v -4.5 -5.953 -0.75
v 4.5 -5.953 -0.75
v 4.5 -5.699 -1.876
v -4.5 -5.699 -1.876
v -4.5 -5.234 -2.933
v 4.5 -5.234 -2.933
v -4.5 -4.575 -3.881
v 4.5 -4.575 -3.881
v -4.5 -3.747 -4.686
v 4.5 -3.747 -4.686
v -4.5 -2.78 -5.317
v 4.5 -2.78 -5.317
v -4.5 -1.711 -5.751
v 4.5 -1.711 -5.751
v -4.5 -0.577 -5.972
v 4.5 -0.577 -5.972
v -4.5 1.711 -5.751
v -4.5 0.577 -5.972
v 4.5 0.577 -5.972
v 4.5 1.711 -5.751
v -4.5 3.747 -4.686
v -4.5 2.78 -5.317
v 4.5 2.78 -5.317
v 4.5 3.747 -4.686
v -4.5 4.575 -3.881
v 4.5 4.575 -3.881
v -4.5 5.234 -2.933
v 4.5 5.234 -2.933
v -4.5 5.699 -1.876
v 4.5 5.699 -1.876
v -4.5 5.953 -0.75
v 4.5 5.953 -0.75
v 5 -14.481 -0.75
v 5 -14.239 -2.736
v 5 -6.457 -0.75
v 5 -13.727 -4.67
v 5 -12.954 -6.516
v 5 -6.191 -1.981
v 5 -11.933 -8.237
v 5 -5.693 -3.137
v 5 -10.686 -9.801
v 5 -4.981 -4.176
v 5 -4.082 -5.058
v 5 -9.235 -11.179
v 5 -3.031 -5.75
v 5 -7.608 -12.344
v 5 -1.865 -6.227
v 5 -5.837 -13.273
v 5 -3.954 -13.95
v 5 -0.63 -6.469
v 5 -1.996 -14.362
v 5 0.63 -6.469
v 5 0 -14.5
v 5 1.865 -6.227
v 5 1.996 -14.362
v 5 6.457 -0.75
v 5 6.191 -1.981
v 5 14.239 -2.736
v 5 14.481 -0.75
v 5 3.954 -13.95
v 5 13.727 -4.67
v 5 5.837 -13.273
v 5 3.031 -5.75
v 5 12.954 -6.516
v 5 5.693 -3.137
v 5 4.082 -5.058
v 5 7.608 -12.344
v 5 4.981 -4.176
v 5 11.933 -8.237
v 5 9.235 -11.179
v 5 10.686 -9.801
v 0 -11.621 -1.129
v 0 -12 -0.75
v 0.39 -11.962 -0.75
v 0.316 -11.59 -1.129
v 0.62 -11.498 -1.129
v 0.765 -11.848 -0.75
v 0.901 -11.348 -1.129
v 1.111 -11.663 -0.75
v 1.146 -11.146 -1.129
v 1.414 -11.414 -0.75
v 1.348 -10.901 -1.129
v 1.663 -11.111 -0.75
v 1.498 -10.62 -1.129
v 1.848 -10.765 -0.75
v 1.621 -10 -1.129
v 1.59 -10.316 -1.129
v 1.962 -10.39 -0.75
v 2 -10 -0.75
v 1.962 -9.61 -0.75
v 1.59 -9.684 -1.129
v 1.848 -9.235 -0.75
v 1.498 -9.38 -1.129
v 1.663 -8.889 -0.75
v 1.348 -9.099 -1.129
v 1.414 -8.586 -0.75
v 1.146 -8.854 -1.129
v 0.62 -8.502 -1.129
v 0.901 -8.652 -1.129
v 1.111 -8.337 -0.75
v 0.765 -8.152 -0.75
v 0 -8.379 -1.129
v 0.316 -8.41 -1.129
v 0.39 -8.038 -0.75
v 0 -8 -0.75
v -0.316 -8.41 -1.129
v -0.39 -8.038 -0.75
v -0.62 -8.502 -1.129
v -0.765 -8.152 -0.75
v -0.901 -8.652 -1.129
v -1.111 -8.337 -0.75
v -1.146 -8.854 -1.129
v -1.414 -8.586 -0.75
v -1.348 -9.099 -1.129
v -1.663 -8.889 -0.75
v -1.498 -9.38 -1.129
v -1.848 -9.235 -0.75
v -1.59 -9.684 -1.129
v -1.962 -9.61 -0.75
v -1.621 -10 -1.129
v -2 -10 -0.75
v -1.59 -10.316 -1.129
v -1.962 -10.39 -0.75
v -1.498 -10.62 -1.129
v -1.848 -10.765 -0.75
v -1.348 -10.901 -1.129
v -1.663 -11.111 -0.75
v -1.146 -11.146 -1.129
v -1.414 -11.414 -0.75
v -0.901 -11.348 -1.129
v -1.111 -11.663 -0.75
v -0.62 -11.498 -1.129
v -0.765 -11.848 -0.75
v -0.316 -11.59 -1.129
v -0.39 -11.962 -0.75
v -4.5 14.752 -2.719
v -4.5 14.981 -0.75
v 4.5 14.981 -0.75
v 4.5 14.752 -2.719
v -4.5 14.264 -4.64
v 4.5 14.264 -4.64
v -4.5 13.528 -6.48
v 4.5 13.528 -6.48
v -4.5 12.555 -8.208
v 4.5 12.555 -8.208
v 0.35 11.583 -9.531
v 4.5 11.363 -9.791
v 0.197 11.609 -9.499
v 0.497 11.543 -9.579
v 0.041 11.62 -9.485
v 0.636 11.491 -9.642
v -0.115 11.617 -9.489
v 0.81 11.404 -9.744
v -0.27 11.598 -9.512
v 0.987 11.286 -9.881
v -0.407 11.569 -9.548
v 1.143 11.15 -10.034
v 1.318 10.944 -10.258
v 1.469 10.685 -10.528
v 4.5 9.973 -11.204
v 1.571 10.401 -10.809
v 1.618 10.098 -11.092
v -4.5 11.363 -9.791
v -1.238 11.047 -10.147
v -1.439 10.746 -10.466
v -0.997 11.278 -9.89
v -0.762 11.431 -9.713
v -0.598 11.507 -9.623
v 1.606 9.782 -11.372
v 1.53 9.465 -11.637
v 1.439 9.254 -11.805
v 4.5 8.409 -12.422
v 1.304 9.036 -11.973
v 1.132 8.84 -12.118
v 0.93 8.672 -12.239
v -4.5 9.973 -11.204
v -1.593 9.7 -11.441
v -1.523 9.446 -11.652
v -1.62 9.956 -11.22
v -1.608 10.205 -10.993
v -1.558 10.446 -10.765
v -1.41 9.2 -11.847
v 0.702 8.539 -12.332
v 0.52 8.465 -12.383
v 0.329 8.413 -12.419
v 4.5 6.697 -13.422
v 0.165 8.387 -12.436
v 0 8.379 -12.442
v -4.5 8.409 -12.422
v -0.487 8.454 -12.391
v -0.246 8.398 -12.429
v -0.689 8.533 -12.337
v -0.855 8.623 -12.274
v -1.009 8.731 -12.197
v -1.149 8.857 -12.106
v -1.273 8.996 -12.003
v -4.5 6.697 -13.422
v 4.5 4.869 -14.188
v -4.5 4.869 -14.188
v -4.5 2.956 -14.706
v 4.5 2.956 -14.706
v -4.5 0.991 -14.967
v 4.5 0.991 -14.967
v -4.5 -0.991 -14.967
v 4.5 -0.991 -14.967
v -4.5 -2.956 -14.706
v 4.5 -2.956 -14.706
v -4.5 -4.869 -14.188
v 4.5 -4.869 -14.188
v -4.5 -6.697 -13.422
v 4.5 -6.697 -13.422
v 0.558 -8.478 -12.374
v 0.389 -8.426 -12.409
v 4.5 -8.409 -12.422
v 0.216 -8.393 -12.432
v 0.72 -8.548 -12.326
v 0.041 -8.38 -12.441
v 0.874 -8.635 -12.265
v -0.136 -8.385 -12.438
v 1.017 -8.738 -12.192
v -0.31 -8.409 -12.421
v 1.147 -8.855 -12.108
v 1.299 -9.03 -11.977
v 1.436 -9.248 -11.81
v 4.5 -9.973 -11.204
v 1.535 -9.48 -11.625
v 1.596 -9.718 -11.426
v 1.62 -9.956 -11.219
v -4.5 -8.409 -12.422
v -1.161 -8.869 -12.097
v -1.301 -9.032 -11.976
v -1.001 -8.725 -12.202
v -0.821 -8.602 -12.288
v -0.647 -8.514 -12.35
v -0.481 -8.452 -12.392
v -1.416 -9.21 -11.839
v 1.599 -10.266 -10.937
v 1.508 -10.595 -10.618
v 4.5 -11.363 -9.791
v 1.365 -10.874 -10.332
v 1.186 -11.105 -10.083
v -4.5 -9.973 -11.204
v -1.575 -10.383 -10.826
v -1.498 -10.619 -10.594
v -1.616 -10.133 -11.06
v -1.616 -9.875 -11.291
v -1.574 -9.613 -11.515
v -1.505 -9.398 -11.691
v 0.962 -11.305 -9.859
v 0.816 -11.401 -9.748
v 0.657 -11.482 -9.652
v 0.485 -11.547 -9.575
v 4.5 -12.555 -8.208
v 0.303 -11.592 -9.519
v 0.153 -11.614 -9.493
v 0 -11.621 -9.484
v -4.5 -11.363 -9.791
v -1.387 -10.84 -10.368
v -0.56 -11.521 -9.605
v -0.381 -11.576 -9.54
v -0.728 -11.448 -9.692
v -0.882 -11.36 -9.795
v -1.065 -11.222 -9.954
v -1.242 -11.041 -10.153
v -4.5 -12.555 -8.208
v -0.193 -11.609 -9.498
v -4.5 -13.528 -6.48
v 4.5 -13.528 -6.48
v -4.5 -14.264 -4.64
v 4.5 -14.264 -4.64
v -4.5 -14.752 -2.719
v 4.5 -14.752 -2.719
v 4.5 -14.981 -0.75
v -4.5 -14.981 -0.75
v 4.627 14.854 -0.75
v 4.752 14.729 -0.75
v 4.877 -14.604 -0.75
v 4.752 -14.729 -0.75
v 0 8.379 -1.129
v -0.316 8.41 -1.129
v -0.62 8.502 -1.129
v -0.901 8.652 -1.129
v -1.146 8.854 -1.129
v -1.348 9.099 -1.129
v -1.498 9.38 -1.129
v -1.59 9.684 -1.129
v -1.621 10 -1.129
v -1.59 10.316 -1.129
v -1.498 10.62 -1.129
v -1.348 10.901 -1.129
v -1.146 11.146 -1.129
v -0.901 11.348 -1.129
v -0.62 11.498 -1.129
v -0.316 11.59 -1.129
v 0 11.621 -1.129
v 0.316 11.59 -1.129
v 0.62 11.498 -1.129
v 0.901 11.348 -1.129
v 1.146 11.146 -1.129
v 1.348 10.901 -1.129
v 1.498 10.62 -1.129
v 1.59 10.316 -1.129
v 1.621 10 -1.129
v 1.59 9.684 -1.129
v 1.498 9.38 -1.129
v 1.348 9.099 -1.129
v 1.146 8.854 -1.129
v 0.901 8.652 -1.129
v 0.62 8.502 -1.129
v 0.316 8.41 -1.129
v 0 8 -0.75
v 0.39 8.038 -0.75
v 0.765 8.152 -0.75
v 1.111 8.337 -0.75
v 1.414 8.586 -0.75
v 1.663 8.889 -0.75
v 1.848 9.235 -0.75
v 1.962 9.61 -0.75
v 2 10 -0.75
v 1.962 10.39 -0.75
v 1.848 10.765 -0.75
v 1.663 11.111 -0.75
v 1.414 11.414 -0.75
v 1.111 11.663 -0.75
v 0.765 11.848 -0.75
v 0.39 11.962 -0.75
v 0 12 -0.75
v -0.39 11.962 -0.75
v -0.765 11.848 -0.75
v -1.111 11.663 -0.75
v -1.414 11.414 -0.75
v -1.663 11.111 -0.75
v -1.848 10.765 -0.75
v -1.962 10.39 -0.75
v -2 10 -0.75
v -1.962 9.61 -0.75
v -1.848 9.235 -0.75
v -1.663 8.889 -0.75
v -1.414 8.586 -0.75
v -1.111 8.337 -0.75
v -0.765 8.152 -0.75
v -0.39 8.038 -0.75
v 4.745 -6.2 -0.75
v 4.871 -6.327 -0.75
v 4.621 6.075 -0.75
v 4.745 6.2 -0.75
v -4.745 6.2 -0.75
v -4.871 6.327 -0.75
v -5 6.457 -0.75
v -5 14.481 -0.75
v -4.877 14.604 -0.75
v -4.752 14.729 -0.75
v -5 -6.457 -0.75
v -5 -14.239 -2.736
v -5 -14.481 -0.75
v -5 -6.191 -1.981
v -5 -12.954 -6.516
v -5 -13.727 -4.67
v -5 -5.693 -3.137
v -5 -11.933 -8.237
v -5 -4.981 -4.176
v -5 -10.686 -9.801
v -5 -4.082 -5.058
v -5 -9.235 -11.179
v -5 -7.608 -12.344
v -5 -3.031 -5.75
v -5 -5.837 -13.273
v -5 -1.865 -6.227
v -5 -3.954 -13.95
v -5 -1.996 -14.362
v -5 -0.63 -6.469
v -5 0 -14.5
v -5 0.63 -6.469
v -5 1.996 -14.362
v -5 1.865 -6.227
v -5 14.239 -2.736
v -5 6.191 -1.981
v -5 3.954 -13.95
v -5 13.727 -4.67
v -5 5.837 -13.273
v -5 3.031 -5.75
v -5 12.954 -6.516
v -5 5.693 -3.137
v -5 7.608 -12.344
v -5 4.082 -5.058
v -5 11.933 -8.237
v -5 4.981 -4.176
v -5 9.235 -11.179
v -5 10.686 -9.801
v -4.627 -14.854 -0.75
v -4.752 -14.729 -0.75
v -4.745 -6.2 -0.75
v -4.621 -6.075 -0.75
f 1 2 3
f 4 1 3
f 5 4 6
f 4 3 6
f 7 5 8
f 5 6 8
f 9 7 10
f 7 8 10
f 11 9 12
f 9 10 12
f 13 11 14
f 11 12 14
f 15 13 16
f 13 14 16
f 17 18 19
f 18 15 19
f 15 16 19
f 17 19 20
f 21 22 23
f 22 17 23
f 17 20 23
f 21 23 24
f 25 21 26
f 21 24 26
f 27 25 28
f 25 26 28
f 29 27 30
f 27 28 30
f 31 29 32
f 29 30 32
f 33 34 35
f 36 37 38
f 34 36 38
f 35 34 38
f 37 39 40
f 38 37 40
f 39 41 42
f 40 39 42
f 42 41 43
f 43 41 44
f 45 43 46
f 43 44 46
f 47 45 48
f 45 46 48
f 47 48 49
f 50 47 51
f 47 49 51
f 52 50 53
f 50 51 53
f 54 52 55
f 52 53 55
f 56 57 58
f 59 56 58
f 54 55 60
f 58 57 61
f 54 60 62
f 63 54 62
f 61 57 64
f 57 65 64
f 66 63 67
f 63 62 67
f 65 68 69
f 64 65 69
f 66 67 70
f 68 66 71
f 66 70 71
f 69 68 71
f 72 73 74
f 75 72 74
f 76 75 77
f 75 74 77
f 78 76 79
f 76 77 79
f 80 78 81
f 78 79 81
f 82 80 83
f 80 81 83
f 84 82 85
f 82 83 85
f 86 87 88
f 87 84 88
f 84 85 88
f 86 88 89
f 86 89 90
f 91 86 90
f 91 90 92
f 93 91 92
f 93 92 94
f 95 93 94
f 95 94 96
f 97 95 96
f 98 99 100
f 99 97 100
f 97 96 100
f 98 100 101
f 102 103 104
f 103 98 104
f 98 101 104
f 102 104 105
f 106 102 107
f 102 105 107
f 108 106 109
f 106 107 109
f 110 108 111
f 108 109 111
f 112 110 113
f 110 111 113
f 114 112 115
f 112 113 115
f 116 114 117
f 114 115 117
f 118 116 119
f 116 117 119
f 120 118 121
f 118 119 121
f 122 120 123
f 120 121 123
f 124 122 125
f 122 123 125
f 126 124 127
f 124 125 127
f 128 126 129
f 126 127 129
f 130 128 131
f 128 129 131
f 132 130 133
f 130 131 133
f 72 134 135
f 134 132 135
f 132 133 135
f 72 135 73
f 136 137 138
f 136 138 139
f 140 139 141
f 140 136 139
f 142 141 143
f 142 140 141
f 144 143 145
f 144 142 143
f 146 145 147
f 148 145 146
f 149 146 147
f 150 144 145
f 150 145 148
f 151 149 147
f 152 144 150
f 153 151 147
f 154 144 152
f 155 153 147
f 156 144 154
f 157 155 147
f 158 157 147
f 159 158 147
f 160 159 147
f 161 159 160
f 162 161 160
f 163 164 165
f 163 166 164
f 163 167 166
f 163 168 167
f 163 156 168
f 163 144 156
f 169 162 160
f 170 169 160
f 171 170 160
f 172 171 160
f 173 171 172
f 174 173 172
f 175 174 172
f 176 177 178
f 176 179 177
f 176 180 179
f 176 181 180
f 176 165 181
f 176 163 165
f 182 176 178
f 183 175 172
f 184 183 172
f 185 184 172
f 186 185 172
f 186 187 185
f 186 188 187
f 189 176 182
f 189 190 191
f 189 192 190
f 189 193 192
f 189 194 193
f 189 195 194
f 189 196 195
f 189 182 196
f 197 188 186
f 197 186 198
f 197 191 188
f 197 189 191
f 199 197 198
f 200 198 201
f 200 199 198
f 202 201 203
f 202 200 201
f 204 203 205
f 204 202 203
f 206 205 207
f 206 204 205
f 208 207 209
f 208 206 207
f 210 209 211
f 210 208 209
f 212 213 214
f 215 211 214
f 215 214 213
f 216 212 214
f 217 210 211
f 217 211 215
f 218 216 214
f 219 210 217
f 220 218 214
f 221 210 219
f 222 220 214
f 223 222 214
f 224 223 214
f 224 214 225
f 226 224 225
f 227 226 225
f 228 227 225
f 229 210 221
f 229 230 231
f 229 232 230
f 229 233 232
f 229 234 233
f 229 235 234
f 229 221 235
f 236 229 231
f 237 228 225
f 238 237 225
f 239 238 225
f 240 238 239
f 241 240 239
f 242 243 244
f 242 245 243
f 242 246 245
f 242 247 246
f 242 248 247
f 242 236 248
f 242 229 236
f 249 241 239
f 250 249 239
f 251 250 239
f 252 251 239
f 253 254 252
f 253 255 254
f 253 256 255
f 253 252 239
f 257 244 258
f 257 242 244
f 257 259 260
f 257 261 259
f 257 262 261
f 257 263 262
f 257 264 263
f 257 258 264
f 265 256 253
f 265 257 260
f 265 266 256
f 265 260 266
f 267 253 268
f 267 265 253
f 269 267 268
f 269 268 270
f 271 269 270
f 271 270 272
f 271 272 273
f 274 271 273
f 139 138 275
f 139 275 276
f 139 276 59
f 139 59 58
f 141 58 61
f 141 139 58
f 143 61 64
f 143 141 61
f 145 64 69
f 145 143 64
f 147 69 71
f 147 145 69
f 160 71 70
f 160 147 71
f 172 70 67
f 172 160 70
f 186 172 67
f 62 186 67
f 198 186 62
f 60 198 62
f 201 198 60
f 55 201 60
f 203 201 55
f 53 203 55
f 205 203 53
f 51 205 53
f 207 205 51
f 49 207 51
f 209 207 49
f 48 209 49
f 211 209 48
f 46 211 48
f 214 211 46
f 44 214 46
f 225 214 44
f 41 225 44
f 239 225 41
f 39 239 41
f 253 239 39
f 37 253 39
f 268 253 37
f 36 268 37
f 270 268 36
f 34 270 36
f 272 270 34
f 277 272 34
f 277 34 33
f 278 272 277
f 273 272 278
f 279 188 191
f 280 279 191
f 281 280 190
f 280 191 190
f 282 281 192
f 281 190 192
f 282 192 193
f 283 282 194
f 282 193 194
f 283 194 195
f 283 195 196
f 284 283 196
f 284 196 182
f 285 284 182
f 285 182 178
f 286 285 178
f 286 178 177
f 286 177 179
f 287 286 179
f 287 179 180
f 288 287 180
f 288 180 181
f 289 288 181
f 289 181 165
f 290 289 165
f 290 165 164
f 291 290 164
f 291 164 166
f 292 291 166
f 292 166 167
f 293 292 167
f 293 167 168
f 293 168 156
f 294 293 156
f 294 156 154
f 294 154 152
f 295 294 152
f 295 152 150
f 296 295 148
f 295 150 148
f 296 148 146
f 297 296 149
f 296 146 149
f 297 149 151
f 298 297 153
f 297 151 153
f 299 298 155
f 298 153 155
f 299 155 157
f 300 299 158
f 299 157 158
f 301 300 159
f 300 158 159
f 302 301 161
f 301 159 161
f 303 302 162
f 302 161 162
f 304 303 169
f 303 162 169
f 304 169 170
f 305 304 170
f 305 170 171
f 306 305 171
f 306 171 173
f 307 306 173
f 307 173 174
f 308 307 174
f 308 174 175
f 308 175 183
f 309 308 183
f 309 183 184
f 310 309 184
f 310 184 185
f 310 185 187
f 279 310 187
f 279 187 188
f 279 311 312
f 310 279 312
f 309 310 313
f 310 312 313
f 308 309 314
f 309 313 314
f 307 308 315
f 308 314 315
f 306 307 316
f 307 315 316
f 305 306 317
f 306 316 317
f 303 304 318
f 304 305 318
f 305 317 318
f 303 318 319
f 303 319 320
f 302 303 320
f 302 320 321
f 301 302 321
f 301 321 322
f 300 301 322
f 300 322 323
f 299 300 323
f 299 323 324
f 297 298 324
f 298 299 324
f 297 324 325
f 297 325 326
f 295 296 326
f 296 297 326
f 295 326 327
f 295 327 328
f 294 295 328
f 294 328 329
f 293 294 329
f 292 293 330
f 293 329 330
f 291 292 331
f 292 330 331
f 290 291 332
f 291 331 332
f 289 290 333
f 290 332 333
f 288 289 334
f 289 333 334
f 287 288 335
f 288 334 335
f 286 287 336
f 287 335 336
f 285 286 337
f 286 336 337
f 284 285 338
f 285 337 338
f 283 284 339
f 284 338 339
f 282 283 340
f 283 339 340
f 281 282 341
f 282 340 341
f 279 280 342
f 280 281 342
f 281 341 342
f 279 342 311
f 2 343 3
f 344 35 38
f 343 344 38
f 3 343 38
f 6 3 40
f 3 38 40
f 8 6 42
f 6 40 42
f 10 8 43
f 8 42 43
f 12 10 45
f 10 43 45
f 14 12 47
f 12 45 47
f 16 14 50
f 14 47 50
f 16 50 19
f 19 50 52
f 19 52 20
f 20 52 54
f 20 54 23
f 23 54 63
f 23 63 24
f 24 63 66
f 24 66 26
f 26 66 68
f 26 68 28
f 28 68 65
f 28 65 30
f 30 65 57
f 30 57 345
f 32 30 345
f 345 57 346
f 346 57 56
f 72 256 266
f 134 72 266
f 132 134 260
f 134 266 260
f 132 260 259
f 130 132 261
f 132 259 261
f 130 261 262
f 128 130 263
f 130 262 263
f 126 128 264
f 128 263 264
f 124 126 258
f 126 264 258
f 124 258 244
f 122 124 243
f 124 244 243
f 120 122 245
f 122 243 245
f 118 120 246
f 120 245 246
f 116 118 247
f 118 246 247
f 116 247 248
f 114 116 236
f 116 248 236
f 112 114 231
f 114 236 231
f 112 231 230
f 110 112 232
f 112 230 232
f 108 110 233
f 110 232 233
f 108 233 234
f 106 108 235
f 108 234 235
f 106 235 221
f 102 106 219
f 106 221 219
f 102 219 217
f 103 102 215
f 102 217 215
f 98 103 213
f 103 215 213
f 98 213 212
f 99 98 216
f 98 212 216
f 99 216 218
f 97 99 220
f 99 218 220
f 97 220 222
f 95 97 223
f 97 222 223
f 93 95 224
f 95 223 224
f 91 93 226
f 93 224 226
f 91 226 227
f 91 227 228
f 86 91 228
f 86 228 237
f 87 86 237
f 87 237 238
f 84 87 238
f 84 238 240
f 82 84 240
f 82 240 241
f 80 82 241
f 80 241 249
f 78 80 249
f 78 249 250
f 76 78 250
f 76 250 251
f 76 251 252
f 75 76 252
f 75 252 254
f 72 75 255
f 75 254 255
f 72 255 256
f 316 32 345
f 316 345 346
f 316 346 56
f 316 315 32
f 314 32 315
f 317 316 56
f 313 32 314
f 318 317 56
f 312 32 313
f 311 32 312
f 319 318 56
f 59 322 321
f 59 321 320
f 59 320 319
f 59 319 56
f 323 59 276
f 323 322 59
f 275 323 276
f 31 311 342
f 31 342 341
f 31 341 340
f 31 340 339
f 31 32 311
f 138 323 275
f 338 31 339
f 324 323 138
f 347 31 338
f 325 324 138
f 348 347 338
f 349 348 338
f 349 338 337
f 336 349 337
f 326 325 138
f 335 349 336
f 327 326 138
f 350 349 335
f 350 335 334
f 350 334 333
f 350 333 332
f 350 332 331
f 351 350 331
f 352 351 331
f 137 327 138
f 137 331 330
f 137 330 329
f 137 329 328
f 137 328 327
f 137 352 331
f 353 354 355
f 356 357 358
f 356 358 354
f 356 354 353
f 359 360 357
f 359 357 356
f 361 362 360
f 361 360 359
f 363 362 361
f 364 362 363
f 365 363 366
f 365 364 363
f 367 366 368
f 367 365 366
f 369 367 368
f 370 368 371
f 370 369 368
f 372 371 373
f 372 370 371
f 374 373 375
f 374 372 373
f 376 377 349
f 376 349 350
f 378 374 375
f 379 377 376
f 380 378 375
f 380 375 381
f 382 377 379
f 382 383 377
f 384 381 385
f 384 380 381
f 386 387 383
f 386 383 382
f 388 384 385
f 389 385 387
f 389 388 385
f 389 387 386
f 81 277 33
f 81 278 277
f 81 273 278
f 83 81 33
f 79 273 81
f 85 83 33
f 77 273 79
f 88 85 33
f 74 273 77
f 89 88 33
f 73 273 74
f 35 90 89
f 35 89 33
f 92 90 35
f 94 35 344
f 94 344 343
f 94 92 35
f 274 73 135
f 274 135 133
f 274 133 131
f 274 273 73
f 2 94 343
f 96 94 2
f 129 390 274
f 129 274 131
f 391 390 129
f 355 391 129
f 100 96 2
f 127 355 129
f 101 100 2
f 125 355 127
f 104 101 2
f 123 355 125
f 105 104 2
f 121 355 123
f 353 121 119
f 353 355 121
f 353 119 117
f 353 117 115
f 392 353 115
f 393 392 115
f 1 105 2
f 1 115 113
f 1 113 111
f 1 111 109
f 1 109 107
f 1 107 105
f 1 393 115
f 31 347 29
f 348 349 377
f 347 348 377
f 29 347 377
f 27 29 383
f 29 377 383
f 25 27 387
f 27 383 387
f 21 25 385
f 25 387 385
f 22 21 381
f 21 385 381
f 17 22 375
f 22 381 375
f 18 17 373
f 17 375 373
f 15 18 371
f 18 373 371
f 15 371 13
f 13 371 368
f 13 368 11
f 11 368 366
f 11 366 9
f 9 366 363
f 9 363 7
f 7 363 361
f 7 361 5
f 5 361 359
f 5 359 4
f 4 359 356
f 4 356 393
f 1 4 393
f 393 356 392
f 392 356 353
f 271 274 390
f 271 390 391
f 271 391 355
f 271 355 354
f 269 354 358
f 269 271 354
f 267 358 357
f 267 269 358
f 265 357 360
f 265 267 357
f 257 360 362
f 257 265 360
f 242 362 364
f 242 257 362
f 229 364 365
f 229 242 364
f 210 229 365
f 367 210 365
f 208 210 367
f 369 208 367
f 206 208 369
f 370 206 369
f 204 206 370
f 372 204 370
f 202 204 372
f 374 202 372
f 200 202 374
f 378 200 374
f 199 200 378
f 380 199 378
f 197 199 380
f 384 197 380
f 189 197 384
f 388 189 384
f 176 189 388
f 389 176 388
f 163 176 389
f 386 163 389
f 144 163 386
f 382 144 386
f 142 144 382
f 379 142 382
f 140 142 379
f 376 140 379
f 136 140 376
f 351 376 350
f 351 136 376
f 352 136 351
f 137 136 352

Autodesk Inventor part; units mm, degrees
sketch "Sketch_1" plane through (0, 0, 0) normal (0, 0, 1) x (1, 0, 0)
  line L0 (5, 0) -> (-5, 0)
  line L1 (-5, 14.5) -> (-5, 6.5)
  line L2 (-5, 6.5) -> (-4.5, 6)
  line L3 (-4.5, 6) -> (4.5, 6)
  line L4 (4.5, 6) -> (5, 6.5)
  line L5 (5, 6.5) -> (5, 14.5)
  line L6 (5, 14.5) -> (4.5, 15)
  line L7 (4.5, 15) -> (-4.5, 15)
  line L8 (-4.5, 15) -> (-5, 14.5)
revolve "Revolution1" add sketch "Sketch_1" angle 180 about axis through (5, 0, 0) along (-1, 0, 0)
sketch "Sketch_2" plane through (0, 0, 0) normal (1, 0, 0) x (0, 1, 0)
  line L0 (-16, 0.75) -> (-16, -0.75)
  line L1 (-16, -0.75) -> (16, -0.75)
  line L2 (16, -0.75) -> (16, 0.75)
  line L3 (16, 0.75) -> (-16, 0.75)
extrude "Extrusion1" cut sketch "Sketch_2" along normal mid plane 10
sketch "Sketch3" plane through (-4.5, -5.9529, -0.75) normal (0, 0, 1) x (1, 0, 0)
  point P0 (4.5, -4.0471)
hole "Hole1" at (0, -10, -0.75) direction (0, 0, -1) diameter 3.242 depth 15 countersink diameter 4 countersink angle 90 thread size "M4x0.7" class "6H" standard "ISO Metric profile"
sketch "Sketch4" plane through (-4.5, 14.9812, -0.75) normal (0, 0, 1) x (1, 0, 0)
  point P0 (4.5, -4.9812)
hole "Hole2" at (0, 10, -0.75) direction (0, 0, -1) diameter 3.242 depth 15 countersink diameter 4 countersink angle 90 thread size "M4x0.7" class "6H" standard "ISO Metric profile"
ref_plane "2_1_XY" through (0, 0, 0) normal (0, 0, 1) x (1, 0, 0)
ref_plane "2_1_YZ" through (0, 0, 0) normal (1, 0, 0) x (0, 1, 0)
ref_plane "2_1_ZX" through (0, 0, 0) normal (0, 1, 0) x (0, 0, 1)
properties part number "SSCSP12-10p"
